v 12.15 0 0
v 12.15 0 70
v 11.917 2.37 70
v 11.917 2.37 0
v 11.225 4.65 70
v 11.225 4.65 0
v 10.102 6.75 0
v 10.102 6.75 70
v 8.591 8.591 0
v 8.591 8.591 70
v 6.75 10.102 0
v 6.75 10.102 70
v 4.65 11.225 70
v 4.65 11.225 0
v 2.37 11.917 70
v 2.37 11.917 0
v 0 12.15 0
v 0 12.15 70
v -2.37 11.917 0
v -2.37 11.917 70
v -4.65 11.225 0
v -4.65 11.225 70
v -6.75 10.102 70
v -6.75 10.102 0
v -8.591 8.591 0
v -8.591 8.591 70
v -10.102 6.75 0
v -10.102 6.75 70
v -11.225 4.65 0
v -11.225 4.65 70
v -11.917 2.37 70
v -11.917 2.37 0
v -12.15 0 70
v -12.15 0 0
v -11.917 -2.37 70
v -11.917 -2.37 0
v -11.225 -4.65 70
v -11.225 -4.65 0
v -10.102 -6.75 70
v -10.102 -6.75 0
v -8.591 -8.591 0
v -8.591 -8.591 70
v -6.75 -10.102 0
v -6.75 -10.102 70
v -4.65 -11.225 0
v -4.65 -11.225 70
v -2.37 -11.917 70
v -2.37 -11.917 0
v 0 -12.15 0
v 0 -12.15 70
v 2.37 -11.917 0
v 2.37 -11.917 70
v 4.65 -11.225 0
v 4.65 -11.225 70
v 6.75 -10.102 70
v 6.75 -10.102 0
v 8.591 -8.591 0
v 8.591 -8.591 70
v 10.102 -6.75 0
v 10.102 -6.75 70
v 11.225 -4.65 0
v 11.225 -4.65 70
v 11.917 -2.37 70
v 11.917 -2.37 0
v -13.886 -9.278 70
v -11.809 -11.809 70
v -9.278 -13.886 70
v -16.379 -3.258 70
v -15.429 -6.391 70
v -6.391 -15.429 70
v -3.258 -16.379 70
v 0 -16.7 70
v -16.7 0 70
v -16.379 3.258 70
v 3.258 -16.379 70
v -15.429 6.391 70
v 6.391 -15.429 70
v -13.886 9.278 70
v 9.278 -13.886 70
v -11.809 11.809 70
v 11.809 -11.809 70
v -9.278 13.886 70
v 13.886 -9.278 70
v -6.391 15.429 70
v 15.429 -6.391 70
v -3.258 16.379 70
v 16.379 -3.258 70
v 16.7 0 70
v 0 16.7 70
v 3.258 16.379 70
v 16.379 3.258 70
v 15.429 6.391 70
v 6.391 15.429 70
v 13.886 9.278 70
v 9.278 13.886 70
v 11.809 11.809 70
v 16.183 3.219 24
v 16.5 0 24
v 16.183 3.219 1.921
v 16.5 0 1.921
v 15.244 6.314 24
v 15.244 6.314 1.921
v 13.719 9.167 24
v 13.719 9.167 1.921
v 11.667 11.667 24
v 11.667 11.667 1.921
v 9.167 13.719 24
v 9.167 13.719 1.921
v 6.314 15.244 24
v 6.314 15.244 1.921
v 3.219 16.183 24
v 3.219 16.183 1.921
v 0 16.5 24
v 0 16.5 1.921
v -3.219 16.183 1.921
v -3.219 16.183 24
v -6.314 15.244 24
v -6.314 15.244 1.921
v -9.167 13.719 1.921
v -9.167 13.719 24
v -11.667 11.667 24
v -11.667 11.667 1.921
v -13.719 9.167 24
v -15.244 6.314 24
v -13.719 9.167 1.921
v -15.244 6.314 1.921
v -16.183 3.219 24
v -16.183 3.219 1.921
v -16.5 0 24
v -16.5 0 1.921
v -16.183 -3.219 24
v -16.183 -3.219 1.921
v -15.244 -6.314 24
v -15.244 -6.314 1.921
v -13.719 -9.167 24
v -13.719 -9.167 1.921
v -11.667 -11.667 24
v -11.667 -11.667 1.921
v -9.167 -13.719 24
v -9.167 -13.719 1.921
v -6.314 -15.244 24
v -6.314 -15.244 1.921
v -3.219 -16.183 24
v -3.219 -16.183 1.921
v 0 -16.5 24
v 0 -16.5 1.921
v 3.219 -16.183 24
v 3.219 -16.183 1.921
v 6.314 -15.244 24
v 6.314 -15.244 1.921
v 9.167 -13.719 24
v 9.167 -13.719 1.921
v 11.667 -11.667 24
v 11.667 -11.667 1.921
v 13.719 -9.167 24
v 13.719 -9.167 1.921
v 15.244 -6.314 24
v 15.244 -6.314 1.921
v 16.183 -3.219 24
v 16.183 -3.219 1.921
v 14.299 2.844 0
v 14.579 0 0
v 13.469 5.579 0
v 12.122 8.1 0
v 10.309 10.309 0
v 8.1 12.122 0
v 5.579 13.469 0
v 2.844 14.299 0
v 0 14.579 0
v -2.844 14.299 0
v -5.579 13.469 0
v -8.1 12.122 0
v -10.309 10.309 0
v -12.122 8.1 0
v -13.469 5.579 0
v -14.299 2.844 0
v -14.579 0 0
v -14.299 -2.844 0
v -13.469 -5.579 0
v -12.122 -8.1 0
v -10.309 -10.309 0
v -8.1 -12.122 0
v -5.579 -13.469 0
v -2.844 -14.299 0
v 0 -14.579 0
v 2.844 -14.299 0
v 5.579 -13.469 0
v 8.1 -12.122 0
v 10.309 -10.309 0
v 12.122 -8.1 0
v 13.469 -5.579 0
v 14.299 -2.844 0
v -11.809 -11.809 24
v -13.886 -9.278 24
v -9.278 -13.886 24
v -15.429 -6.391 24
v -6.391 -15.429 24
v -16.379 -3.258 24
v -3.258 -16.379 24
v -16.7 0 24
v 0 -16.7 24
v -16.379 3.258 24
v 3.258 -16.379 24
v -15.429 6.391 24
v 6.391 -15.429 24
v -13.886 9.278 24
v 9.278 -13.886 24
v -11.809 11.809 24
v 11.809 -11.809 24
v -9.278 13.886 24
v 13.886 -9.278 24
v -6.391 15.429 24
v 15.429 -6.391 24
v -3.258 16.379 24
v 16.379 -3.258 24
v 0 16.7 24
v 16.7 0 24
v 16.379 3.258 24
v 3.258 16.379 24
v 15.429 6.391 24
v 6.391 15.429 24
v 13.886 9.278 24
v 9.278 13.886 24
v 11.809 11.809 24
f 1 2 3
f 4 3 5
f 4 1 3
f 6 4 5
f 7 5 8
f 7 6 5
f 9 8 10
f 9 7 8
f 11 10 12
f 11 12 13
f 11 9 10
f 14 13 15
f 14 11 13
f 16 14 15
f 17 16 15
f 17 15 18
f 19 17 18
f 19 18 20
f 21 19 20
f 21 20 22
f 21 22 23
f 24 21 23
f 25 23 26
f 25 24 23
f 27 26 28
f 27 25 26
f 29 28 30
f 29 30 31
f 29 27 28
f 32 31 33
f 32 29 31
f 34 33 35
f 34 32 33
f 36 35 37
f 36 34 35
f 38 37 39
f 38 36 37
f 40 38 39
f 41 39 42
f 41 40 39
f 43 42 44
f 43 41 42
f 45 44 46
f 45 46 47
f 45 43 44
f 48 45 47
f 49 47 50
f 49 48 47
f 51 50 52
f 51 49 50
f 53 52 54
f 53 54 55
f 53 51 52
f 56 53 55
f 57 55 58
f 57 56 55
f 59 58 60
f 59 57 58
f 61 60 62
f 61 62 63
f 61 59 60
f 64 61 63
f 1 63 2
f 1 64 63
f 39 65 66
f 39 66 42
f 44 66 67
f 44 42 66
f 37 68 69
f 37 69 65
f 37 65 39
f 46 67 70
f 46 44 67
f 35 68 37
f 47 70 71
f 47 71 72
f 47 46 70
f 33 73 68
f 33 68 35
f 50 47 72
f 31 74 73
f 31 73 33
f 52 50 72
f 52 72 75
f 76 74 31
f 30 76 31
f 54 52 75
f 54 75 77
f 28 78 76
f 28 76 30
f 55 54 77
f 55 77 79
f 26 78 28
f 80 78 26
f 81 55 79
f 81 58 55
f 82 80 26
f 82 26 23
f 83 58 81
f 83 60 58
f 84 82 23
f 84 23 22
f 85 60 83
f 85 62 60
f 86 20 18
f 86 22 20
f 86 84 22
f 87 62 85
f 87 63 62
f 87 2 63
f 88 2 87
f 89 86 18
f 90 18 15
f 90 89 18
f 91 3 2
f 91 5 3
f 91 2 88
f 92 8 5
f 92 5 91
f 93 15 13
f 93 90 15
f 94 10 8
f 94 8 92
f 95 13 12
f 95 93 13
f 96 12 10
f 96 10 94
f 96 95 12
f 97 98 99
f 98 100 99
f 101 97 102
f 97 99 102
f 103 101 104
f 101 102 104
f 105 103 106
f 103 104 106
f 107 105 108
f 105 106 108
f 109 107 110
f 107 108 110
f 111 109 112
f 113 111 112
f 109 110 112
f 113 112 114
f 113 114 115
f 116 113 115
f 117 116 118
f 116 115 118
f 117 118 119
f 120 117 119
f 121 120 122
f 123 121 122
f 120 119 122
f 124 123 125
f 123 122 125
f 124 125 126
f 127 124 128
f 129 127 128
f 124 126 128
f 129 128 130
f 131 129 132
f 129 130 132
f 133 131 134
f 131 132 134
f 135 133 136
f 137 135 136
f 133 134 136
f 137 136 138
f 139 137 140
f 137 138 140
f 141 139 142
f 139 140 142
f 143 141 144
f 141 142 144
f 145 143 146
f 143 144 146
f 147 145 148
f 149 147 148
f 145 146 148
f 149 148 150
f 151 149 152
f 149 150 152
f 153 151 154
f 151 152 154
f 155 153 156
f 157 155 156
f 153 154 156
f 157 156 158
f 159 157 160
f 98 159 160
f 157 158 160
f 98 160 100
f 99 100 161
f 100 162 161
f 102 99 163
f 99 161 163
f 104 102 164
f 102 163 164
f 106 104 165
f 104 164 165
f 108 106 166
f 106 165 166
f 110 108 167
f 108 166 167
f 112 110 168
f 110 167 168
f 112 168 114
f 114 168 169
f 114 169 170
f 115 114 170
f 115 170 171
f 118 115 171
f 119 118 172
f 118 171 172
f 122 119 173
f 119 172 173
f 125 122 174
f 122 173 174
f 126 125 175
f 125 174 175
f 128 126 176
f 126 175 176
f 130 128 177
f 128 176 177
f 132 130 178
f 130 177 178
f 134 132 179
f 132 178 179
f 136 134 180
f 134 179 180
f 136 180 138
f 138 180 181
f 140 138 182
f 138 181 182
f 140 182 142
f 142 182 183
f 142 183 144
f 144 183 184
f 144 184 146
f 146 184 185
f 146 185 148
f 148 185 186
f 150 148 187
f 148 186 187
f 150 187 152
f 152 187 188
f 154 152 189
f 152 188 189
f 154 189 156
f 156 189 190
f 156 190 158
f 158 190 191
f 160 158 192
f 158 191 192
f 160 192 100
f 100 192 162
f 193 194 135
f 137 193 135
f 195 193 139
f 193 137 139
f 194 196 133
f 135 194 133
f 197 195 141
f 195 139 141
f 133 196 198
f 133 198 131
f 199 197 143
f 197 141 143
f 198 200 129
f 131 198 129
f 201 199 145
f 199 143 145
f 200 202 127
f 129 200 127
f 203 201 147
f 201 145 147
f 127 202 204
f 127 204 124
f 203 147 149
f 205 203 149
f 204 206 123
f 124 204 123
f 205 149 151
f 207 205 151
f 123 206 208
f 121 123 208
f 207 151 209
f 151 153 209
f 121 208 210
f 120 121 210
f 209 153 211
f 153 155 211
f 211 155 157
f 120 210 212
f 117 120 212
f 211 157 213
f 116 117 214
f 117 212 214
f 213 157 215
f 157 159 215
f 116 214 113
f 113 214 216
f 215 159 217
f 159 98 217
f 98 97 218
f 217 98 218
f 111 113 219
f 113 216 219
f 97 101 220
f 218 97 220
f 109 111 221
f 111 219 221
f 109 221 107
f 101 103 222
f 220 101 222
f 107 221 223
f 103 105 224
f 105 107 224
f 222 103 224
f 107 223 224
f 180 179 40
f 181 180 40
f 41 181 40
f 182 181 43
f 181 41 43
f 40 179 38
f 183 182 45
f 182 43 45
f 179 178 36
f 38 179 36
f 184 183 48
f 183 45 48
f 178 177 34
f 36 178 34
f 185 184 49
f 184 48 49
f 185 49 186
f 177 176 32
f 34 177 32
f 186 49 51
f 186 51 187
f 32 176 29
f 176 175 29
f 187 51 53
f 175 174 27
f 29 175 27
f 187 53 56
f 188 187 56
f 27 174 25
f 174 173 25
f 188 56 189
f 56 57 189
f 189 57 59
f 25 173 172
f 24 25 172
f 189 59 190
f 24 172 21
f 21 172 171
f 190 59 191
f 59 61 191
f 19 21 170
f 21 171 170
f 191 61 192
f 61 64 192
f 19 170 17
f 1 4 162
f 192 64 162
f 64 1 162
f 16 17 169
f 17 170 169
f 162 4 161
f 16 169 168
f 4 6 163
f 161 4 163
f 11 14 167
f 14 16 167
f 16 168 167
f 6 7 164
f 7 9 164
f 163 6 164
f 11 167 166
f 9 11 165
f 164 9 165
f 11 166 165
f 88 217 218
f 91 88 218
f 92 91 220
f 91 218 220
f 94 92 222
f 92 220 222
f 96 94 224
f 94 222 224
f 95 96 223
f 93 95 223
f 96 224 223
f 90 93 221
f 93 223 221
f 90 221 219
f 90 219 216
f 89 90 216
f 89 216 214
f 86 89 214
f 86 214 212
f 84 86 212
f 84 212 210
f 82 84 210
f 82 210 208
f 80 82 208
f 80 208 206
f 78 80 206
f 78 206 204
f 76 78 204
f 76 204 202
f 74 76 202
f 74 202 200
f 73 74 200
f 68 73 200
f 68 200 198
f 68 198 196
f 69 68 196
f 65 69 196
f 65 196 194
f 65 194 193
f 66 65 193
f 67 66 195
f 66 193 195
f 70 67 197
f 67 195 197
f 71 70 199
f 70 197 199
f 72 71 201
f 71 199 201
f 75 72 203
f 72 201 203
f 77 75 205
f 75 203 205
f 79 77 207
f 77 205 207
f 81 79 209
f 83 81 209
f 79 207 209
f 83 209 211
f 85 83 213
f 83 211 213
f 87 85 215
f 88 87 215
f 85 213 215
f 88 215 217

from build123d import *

# Parameters (mm, degrees)
SKETCH1_R           = 16.7
SKETCH1_R_2         = 12.15
BOSS_EXTRUDE1_DEPTH = 70


# Read off the part's stored shape, not the designer's step: M33x3.5 Machine Threads Stud1
with BuildPart() as part:
    # Sketch1 → Boss-Extrude1 (new body)
    with BuildSketch(Plane.XY):
        Circle(SKETCH1_R)
        Circle(SKETCH1_R_2, mode=Mode.SUBTRACT)
    extrude(amount=BOSS_EXTRUDE1_DEPTH)

    # M33x3.5 Machine Threads Stud1 outline → M33x3.5 Machine Threads Stud1 (revolve, cut)
    with BuildSketch(Plane.XZ):
        Polygon((14.579, 0), (16.7, 0), (16.7, 24), (16.5, 24), (16.5, 1.921), align=None)
    revolve(axis=Axis((0, 0, 0), (0, 0, 1)), mode=Mode.SUBTRACT)


solid = part.part
